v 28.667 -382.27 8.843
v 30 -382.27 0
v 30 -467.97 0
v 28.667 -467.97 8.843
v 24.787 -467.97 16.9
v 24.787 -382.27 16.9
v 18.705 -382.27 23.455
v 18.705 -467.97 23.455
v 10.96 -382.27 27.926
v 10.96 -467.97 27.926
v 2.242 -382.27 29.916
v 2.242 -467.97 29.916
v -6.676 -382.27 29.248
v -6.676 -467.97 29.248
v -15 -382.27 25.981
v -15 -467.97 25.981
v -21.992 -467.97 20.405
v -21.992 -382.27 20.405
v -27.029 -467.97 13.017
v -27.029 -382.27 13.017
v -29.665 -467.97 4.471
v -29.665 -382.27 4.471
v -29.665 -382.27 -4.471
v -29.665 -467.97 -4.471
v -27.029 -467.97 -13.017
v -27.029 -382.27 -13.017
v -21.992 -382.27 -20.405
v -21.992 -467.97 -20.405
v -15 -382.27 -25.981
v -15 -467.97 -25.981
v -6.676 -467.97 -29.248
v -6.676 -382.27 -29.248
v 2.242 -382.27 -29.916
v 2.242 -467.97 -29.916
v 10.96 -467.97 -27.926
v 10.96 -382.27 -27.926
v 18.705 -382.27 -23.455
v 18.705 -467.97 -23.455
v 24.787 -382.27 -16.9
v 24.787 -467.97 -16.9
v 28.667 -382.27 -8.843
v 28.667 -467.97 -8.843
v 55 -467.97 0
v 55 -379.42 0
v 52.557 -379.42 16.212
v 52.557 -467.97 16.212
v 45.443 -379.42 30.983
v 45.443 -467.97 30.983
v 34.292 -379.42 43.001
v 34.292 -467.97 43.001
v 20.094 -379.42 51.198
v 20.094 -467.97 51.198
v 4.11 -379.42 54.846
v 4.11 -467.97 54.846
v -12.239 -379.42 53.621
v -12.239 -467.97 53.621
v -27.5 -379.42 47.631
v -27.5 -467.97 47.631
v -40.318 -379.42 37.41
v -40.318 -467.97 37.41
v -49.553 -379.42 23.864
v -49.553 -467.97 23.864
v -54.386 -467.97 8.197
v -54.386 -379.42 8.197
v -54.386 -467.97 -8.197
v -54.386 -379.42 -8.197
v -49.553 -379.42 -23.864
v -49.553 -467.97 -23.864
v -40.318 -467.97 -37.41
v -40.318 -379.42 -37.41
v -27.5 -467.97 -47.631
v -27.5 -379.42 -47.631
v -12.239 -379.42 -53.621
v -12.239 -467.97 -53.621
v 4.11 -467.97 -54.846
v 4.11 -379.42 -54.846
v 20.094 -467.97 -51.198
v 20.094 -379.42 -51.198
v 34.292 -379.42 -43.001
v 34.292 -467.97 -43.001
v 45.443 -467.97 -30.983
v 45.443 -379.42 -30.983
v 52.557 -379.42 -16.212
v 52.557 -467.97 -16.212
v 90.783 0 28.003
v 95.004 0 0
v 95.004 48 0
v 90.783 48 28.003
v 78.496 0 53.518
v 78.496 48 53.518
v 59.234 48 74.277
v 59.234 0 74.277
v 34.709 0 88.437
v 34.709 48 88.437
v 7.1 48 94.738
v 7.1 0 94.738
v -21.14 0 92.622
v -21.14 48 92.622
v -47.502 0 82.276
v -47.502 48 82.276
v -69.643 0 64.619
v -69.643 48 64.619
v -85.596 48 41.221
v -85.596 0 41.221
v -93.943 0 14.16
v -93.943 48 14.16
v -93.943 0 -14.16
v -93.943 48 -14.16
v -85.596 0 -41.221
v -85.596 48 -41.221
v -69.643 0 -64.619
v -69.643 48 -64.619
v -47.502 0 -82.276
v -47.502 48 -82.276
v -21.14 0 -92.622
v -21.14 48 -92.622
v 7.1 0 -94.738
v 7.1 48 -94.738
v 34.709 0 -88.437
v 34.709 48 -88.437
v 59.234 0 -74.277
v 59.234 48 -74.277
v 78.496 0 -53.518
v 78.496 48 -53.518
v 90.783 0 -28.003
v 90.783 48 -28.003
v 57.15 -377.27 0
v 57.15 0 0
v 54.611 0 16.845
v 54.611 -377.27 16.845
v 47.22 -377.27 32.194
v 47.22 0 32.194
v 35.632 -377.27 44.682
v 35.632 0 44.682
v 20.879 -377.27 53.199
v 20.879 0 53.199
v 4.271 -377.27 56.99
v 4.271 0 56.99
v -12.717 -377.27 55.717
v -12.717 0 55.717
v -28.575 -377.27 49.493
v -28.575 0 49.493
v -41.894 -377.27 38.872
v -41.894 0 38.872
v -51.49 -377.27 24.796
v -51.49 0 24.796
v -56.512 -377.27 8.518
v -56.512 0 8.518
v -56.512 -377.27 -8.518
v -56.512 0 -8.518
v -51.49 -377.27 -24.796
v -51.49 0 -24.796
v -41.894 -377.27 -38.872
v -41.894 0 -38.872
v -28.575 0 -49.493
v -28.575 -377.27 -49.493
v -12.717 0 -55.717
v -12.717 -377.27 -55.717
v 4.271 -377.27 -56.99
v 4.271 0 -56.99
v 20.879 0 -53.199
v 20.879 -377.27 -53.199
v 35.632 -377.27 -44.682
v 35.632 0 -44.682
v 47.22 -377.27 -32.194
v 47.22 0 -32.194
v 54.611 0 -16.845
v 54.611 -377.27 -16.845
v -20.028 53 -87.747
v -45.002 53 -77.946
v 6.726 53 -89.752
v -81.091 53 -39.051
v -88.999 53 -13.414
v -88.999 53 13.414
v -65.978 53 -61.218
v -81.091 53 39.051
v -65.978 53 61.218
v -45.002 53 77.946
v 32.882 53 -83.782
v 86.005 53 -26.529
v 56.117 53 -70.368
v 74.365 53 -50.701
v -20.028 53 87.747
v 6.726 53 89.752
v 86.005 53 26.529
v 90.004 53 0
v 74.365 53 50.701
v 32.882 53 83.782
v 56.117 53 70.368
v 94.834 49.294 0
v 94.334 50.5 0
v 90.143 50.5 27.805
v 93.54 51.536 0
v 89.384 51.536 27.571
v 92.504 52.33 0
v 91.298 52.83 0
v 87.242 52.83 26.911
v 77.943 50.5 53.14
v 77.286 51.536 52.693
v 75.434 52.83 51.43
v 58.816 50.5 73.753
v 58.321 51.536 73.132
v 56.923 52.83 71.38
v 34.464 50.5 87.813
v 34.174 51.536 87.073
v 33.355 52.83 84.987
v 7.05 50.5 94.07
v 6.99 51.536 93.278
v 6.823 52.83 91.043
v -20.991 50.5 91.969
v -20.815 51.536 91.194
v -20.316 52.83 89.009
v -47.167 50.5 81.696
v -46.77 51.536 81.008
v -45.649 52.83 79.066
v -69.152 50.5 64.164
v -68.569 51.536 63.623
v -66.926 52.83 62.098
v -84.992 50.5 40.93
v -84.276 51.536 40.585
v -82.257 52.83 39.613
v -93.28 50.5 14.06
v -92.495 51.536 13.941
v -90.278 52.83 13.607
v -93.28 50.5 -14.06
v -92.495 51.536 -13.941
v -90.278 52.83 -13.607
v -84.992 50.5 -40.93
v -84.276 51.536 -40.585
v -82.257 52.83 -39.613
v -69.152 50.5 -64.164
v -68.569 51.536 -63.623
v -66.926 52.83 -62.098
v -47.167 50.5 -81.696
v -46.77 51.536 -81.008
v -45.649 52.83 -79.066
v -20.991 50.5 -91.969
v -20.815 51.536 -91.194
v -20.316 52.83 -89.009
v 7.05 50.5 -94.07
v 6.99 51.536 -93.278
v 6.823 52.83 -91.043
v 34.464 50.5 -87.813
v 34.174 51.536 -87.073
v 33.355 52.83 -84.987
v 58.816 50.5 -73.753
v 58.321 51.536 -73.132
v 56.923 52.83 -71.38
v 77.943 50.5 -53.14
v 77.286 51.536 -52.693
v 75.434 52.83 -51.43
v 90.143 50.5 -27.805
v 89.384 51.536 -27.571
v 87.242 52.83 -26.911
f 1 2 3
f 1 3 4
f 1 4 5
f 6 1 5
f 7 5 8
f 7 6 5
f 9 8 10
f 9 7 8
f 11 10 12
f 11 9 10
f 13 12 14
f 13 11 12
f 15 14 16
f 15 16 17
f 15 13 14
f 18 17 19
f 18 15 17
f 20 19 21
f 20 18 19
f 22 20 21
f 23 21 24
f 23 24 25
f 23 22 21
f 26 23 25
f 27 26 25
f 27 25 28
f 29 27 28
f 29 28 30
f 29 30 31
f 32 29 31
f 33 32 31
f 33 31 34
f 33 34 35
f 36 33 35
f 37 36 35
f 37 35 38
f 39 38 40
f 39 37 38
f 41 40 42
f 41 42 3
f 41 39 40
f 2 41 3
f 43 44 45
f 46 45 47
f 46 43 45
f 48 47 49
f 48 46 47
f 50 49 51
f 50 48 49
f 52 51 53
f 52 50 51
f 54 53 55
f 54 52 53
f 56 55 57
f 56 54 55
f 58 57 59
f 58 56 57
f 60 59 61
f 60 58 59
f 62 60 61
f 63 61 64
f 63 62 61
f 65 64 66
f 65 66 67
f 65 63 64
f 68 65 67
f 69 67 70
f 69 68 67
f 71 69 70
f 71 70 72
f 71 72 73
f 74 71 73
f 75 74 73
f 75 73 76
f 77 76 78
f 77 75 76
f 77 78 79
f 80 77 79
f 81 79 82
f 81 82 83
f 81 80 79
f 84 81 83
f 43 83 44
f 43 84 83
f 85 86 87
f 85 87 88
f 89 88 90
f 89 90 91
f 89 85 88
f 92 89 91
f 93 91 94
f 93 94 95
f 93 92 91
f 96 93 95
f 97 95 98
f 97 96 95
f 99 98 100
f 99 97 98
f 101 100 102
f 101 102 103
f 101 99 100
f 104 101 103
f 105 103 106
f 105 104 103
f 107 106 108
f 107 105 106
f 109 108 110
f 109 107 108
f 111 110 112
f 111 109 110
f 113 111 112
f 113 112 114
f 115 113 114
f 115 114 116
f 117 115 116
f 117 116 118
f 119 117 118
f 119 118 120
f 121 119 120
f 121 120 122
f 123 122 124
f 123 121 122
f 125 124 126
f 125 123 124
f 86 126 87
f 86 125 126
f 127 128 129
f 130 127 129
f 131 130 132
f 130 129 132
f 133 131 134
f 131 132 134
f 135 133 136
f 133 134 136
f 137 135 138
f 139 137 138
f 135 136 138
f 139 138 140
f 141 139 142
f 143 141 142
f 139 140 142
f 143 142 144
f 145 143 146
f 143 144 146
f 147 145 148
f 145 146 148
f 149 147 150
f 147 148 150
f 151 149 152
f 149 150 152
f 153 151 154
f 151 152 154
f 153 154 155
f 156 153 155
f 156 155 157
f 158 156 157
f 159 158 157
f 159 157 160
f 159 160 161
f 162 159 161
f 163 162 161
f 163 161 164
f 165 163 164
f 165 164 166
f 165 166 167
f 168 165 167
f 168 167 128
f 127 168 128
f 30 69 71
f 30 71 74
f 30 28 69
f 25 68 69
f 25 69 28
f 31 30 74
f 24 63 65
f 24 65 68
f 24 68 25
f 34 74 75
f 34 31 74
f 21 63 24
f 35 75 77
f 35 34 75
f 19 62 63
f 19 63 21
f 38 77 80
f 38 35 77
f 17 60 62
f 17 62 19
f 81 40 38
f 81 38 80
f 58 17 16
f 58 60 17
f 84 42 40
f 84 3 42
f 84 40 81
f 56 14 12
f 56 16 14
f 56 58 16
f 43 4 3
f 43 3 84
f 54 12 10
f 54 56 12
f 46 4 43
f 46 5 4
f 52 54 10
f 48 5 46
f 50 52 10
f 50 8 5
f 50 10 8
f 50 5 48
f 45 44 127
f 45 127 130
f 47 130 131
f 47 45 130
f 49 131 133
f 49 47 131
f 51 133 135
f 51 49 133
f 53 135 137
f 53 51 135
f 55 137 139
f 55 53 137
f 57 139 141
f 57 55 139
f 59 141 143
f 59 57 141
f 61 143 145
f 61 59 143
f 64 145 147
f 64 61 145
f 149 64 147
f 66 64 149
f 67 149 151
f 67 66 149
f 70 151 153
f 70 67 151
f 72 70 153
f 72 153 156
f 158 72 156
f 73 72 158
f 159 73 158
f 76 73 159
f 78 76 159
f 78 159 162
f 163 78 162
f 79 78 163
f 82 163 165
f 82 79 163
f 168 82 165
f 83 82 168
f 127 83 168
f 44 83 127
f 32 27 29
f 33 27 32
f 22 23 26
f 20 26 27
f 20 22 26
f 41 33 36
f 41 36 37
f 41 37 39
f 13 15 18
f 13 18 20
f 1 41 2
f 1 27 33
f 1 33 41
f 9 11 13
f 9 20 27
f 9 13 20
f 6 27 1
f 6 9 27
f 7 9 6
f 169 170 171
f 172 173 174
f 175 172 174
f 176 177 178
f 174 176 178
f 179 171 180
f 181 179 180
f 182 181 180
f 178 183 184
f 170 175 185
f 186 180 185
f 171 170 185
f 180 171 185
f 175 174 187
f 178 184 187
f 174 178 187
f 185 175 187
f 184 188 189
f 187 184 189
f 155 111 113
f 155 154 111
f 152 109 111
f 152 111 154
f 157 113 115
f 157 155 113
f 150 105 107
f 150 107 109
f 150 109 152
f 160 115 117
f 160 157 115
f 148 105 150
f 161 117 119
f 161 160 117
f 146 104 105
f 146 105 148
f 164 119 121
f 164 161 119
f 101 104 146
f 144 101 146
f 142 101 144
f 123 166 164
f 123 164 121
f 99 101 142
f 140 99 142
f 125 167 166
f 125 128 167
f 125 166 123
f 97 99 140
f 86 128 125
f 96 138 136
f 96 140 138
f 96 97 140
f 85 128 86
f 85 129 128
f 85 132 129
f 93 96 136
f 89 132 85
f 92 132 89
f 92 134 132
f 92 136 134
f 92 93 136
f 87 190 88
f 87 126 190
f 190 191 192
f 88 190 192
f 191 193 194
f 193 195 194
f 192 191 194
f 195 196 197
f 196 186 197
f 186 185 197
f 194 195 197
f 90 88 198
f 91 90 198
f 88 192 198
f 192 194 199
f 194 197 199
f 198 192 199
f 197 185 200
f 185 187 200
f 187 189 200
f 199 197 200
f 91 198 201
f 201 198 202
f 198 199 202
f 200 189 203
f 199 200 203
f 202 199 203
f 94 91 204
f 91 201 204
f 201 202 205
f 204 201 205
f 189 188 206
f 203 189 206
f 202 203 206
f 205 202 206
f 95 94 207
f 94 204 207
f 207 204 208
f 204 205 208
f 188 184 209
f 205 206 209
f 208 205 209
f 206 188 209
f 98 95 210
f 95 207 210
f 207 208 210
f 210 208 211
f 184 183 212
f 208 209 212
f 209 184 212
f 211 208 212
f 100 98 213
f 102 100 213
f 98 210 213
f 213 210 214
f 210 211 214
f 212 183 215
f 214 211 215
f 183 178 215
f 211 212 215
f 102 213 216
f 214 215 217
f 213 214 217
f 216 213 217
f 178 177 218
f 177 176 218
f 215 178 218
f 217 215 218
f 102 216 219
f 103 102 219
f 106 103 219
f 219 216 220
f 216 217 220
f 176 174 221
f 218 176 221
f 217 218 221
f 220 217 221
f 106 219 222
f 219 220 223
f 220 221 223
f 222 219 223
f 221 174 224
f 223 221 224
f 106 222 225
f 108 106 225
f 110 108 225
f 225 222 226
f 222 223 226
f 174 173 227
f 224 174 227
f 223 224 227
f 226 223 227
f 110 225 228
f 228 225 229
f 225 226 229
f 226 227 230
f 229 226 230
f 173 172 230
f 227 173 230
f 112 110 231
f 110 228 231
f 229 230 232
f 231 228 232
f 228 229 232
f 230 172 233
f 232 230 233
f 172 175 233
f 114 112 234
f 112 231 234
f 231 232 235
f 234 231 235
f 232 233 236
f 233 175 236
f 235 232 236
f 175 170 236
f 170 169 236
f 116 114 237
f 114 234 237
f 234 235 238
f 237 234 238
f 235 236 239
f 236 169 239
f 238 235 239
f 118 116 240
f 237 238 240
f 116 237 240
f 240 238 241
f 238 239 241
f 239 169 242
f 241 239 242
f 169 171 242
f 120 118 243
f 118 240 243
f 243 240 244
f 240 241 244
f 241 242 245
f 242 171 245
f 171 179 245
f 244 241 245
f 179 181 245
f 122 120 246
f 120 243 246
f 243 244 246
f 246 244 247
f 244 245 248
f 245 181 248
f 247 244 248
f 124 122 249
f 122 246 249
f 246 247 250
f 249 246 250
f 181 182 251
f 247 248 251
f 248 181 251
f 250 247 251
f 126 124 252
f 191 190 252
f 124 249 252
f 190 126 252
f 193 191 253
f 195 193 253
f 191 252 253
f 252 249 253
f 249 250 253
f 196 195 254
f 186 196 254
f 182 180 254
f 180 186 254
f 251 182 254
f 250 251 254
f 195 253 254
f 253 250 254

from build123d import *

# Parameters (mm, degrees)
F0_R        = 57.15
F1_DEPTH    = 382.27
F2_R        = 95.004000019
F3_DEPTH    = 53
F4_R        = 5
F5_R        = 55
F5_R_2      = 30
F6_DEPTH    = 85.7
F7_S5_R     = 55
F7_T6_DEPTH = 82


# Not quite as in the source:
# - a fillet or chamfer that OpenCascade refuses, or shapes differently, is made with other operations: its cross-section is extruded or revolved along the edge and cut away or added


with BuildPart() as f1:
    # F0 (on Front) → F1 (new body)
    with BuildSketch(Plane.XZ):
        Circle(F0_R)
    extrude(amount=F1_DEPTH)

    # F2 (on Front) → F3 (join)
    with BuildSketch(Plane.XZ):
        Circle(F2_R)
    extrude(amount=-F3_DEPTH)

    # F4
    f4_edges = [f1.edges().sort_by_distance(p)[0] for p in [
        (-95.004, 53, 0),
    ]]
    fillet(f4_edges, radius=F4_R)

    # F5 (on face) → F6 (join)
    with BuildSketch(Plane.XZ.offset(382.27)):
        Circle(F5_R)
        Circle(F5_R_2, mode=Mode.SUBTRACT)
    extrude(amount=F6_DEPTH)

    # F7: chamfer of 5 on 1 edges, made by hand


with BuildPart() as f7_tool2:
    # F7_s3 → F7_t4 (revolve)
    with BuildSketch(Plane.XY):
        Polygon((57.15, -377.27), (52.15, -382.27), (57.15, -382.27), align=None)
    revolve(axis=Axis((0, -382.27, 0), (0, -1, 0)))

    # F7_s5 → F7_t6 (cut, symmetric)
    with BuildSketch(Plane.XZ.offset(379.8)):
        Circle(F7_S5_R)
    extrude(amount=F7_T6_DEPTH, both=True, mode=Mode.SUBTRACT)


with BuildPart() as f1_1:
    add(f1.part)

    # F7_t1: cut F7_tool2
    add(f7_tool2.part, mode=Mode.SUBTRACT)


solid = f1_1.part
